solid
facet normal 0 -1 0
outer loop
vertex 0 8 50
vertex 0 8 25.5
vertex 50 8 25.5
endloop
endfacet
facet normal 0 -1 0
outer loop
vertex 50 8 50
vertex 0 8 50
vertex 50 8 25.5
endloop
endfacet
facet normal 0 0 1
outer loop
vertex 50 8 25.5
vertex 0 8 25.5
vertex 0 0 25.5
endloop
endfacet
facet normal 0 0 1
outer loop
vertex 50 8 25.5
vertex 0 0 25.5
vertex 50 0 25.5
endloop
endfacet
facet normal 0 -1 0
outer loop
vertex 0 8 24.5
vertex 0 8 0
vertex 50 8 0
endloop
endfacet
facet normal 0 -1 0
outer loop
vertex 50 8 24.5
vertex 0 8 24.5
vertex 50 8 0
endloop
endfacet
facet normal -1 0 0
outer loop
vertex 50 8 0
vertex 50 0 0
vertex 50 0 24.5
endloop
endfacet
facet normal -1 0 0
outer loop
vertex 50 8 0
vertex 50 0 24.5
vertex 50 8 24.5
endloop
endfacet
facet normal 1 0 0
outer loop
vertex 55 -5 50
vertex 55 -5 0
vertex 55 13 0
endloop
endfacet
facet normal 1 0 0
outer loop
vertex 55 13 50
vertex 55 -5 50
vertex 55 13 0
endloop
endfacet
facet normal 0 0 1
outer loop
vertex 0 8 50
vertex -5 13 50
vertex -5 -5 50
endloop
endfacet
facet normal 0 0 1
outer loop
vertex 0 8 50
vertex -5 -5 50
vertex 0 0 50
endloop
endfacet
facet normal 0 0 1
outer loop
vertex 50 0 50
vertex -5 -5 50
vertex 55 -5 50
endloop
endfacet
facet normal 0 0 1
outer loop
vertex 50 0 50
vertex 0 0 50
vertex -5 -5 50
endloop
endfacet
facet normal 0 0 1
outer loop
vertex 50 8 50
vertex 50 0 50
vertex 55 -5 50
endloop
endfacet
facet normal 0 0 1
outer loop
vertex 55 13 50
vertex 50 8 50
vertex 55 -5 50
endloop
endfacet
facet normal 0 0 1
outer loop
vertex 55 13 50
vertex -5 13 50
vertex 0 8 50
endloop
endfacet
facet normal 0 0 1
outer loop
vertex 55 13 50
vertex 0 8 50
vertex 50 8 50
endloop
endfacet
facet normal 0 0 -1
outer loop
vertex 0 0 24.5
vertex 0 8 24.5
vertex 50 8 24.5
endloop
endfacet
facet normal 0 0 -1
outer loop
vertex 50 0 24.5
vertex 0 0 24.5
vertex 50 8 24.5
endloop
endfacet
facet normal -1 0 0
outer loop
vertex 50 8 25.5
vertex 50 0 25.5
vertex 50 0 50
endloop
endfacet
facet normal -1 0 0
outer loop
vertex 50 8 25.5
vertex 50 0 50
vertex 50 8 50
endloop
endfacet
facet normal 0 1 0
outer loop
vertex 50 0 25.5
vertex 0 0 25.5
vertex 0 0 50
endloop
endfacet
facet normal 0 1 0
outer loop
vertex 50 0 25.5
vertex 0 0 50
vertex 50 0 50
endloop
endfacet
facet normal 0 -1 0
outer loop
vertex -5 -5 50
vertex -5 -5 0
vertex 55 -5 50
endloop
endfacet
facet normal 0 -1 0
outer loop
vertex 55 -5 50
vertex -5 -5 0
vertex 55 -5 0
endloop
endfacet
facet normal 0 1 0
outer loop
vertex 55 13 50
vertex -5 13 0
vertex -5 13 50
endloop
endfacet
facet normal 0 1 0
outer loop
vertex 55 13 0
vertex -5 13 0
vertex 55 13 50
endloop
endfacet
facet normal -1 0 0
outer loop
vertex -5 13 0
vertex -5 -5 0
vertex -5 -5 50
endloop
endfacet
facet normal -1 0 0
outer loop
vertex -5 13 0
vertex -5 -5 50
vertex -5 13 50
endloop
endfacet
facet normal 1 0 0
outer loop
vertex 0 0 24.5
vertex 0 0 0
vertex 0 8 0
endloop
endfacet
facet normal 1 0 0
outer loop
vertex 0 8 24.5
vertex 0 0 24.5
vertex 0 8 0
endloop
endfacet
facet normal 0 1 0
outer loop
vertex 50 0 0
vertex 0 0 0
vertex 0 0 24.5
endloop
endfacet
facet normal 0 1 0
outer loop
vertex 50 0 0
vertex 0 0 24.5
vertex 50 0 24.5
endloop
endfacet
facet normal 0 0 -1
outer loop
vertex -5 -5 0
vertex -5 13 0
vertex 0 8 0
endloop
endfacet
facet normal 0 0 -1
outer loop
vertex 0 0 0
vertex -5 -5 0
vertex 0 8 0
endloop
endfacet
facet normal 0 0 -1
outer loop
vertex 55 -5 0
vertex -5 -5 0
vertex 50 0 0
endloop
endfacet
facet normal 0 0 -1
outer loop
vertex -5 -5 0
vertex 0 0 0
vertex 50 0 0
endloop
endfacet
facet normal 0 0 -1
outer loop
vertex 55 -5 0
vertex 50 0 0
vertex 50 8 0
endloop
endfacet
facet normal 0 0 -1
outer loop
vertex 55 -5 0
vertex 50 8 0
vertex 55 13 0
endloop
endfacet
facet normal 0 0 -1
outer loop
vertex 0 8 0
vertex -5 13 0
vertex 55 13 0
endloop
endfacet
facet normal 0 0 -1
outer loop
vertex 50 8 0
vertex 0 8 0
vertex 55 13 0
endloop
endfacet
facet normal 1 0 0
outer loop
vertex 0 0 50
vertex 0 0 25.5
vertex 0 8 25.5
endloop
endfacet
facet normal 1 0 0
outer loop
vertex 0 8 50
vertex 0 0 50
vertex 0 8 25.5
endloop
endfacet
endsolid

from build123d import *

# Parameters (mm, degrees)
SKETCH_1_W      = 60
SKETCH_1_H      = 18
SKETCH_1_W_2    = 50
SKETCH_1_H_2    = 8
EXTRUDE_1_DEPTH = 50
SKETCH_2_W      = 50
SKETCH_2_H      = 8
EXTRUDE_2_DEPTH = 0.5


with BuildPart() as part:
    # 스케치1 → 보스-돌출1 (new body)
    with BuildSketch(Plane.XY):
        with Locations((25, 4)):
            Rectangle(SKETCH_1_W, SKETCH_1_H)
        with Locations((25, 4)):
            Rectangle(SKETCH_1_W_2, SKETCH_1_H_2, mode=Mode.SUBTRACT)
    extrude(amount=EXTRUDE_1_DEPTH)

    # 스케치2 → 보스-돌출2 (add, symmetric)
    with BuildSketch(Plane.XY.offset(25)):
        with Locations((25, 4)):
            Rectangle(SKETCH_2_W, SKETCH_2_H)
    extrude(amount=EXTRUDE_2_DEPTH, both=True)


solid = part.part
